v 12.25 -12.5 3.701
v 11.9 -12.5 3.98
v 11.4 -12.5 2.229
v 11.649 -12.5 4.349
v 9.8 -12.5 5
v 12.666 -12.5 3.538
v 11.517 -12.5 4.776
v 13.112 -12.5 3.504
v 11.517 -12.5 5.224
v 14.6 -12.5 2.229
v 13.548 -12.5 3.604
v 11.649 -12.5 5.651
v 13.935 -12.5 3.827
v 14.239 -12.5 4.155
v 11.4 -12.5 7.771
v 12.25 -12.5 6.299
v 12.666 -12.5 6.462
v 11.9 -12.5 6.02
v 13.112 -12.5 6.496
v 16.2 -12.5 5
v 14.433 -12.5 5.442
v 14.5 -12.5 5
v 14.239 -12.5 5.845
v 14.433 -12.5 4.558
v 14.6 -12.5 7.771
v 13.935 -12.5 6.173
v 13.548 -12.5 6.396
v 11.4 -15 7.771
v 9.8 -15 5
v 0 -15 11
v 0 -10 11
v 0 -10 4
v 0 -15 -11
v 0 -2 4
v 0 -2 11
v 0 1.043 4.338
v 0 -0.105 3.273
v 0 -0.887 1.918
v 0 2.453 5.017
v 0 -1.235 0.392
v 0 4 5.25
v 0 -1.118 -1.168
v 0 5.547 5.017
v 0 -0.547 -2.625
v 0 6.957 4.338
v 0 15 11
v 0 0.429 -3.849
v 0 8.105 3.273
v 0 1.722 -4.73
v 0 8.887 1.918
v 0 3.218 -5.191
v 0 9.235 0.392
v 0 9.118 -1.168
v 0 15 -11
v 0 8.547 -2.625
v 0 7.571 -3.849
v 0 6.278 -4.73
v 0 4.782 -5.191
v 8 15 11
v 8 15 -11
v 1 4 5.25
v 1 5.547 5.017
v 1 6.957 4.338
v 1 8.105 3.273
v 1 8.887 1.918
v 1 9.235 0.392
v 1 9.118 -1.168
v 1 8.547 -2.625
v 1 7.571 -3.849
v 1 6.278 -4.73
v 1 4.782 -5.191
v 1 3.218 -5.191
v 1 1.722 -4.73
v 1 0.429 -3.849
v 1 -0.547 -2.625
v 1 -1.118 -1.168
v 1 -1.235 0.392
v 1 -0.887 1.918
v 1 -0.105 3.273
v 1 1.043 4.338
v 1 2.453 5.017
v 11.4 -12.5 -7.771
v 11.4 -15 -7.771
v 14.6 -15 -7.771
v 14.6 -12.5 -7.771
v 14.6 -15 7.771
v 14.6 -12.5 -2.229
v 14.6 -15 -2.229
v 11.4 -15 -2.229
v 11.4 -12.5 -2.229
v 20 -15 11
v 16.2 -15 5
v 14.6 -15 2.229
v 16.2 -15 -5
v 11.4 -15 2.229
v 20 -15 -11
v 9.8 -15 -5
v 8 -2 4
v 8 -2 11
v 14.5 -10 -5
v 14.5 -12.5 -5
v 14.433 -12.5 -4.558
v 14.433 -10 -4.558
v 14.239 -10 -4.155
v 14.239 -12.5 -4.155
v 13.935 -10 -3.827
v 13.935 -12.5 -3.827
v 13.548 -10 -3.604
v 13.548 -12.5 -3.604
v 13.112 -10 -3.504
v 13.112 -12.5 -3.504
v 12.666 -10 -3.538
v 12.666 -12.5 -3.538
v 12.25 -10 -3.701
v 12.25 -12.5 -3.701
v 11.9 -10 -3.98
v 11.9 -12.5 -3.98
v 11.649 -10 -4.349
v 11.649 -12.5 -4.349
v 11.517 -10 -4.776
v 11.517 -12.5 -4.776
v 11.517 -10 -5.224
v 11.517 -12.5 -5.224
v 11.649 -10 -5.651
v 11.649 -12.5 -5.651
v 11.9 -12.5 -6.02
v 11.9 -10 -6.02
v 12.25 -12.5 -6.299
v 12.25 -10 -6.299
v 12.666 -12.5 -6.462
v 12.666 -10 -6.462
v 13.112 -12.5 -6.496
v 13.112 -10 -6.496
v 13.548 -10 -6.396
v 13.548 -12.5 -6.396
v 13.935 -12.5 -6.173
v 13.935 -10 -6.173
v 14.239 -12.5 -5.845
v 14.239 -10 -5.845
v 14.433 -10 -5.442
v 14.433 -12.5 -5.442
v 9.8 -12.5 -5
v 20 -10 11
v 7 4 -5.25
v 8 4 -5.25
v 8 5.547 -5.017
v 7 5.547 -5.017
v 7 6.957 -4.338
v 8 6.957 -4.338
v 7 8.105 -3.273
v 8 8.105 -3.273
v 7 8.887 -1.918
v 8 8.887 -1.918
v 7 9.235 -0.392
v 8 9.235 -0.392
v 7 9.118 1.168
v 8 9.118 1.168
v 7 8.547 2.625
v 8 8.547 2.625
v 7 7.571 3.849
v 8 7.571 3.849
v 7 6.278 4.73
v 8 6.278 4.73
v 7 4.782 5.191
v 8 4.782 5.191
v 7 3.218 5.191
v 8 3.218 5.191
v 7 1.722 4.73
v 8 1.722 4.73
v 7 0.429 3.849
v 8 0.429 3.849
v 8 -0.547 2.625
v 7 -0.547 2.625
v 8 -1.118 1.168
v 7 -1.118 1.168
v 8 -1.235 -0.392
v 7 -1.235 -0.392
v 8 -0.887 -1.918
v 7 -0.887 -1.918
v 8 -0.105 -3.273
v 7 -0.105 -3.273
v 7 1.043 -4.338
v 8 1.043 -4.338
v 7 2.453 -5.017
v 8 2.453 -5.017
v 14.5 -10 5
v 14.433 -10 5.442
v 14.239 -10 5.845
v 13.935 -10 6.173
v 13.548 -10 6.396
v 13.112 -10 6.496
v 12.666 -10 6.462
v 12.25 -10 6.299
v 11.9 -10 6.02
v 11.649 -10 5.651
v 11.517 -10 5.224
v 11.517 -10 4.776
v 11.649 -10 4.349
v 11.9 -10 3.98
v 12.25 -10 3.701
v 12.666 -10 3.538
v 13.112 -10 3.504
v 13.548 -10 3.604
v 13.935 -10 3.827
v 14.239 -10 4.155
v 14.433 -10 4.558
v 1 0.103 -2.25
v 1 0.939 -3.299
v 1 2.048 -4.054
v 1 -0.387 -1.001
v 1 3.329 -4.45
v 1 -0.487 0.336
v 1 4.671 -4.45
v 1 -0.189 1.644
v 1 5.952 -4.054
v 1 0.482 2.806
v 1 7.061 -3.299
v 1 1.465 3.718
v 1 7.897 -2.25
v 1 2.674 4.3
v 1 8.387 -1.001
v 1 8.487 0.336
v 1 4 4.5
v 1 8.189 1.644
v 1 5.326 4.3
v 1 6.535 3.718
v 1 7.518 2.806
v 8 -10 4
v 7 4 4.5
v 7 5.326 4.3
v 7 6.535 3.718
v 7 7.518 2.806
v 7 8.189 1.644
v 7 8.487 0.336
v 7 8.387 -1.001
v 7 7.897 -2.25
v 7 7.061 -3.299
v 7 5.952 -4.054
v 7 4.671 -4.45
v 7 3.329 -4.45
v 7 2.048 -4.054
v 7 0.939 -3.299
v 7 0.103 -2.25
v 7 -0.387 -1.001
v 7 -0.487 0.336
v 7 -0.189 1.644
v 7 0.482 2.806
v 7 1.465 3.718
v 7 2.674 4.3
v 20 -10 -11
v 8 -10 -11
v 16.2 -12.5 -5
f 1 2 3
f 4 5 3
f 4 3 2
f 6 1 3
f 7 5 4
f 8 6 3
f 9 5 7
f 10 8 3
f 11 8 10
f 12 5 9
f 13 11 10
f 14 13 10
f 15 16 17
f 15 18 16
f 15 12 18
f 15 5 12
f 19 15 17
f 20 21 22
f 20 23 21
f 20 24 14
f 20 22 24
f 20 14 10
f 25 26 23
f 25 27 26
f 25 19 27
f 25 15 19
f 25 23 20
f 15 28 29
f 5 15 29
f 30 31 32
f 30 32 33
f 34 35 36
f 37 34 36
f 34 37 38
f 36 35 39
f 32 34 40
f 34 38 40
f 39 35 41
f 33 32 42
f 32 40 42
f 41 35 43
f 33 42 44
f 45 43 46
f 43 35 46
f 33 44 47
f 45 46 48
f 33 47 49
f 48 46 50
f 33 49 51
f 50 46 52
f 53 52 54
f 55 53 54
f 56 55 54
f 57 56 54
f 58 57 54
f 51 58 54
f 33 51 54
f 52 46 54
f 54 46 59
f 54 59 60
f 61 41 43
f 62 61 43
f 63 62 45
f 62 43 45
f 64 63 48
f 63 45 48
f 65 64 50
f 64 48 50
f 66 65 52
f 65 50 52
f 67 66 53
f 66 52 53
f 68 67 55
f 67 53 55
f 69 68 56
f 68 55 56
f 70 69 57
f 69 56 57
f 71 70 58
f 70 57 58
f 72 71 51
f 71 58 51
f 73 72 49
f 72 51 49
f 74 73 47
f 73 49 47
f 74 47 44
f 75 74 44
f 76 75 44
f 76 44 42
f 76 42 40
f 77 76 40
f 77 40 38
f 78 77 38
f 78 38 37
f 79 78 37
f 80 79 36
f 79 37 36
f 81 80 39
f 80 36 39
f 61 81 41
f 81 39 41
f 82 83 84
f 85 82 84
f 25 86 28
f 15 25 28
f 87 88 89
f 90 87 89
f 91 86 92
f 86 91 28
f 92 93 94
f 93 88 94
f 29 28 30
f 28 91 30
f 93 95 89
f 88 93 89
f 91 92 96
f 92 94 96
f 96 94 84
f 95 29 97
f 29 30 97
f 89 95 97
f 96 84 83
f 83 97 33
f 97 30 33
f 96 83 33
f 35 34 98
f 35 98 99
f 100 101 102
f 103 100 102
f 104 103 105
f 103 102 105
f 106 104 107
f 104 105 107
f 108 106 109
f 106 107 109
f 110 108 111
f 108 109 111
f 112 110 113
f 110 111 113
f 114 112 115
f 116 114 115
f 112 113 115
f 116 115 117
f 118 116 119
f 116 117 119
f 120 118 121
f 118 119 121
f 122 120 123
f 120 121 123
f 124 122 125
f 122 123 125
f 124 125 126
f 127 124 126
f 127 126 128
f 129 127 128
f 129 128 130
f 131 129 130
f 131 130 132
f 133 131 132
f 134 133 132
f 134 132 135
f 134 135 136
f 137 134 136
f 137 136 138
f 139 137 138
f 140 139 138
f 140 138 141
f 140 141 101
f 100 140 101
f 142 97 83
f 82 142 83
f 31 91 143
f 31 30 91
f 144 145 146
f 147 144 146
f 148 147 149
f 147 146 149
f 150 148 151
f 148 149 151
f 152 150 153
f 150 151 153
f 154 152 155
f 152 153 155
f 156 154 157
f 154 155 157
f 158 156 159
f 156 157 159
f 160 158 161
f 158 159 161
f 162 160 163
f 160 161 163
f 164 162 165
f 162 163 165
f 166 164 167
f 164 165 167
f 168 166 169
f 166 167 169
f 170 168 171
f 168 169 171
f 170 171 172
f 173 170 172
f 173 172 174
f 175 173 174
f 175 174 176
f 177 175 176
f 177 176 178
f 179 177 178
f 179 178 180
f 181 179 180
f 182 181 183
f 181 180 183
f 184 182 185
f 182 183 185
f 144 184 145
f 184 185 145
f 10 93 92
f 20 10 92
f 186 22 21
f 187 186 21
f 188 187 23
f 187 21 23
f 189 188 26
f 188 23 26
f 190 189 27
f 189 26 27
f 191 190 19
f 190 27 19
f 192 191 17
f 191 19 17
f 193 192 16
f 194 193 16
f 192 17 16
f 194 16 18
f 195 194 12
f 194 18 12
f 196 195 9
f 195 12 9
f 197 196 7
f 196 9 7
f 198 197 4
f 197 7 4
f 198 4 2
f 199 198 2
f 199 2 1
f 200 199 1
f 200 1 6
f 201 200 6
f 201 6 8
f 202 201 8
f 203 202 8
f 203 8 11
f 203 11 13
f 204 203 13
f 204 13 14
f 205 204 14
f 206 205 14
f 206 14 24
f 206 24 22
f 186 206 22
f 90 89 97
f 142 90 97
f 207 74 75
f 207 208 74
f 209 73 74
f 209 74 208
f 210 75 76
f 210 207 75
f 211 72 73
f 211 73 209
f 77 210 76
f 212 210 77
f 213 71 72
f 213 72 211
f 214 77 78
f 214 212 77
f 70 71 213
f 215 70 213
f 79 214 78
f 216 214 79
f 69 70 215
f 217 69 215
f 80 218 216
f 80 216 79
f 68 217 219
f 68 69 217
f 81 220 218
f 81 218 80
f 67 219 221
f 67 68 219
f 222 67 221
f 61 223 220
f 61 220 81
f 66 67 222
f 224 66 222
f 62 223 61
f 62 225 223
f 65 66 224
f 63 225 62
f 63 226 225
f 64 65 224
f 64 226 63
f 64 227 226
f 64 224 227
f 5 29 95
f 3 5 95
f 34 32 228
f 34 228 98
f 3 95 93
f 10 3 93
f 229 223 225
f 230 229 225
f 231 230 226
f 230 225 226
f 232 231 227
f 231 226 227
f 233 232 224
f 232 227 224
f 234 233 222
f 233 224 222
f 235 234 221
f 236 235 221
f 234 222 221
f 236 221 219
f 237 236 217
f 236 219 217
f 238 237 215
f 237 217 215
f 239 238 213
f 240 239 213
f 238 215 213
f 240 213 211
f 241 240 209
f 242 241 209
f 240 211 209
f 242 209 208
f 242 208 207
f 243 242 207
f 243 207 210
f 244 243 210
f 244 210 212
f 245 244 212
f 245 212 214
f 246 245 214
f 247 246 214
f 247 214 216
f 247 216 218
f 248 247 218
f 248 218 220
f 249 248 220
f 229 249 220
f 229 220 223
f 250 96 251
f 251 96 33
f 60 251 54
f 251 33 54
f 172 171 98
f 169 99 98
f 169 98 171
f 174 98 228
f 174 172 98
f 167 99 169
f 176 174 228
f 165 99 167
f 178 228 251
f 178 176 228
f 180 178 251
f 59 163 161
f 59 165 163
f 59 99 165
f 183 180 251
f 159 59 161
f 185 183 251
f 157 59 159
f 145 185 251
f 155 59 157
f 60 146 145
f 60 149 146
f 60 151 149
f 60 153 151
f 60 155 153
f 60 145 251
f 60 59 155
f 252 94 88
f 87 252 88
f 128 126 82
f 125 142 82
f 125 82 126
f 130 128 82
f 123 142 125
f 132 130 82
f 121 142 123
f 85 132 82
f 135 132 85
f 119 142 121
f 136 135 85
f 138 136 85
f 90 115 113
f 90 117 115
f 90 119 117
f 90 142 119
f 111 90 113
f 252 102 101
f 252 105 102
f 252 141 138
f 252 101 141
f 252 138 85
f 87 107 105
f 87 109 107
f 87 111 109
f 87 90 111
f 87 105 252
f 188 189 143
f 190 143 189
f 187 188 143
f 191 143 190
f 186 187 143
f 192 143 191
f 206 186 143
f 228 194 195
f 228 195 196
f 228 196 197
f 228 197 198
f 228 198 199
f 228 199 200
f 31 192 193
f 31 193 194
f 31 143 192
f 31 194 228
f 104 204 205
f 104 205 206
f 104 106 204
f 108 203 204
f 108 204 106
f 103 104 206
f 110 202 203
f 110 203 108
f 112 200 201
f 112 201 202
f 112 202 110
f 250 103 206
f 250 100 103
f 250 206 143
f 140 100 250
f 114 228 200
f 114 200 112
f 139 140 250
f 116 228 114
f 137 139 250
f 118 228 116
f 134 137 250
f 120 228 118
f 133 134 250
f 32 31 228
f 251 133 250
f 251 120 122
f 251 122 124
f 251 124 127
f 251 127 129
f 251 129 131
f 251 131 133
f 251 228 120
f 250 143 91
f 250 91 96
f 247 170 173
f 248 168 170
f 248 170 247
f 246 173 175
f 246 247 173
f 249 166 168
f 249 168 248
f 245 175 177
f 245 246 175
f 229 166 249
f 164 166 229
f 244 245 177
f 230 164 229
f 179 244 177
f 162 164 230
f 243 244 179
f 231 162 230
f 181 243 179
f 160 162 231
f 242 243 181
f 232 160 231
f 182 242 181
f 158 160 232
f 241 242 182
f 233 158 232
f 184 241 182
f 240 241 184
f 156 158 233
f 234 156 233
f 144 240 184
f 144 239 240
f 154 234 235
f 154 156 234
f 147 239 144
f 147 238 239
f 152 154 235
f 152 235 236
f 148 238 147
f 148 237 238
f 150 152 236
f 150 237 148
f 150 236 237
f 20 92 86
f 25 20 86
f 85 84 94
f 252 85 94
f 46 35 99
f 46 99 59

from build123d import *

# Parameters (mm, degrees)
SKETCH_1_W             = 22
SKETCH_1_H             = 30
EXTRUDE_1_DEPTH        = 8
SKETCH_2_R             = 4.5
CUT_EXTRUDE_1_DEPTH    = 9
SKETCH_3_W             = 7
SKETCH_3_H             = 8
CUT_EXTRUDE_2_DEPTH    = 9
SKETCH_4_R             = 5.25
CUT_EXTRUDE_3_DEPTH    = 1
SKETCH_5_R             = 5.25
CUT_EXTRUDE_4_DEPTH    = 1
SKETCH_6_W             = 22
SKETCH_6_H             = 5
EXTRUDE_2_DEPTH        = 12
CUT_EXTRUDE_5_DEPTH    = 2.5
PATTERN_LINEAR_1_COUNT = 2
PATTERN_LINEAR_1_PITCH = 10
SKETCH_8_R             = 1.5
CUT_EXTRUDE_6_DEPTH    = 28.5
PATTERN_LINEAR_2_COUNT = 2
PATTERN_LINEAR_2_PITCH = 10


with BuildPart() as part:
    # 草图1 → 凸台-拉伸1 (new body)
    with BuildSketch(Plane(origin=(0, 0, 0), x_dir=(0, 0, -1), z_dir=(1, 0, 0))):
        Rectangle(SKETCH_1_W, SKETCH_1_H)
    extrude(amount=EXTRUDE_1_DEPTH)

    # 草图2 → 切除-拉伸1 (cut, through all)
    with BuildSketch(Plane.ZY):
        with Locations((0, 4)):
            Circle(SKETCH_2_R)
    extrude(amount=-CUT_EXTRUDE_1_DEPTH, mode=Mode.SUBTRACT)

    # 草图3 → 切除-拉伸2 (cut, through all)
    with BuildSketch(Plane.ZY):
        with Locations((7.5, -6)):
            Rectangle(SKETCH_3_W, SKETCH_3_H)
    extrude(amount=-CUT_EXTRUDE_2_DEPTH, mode=Mode.SUBTRACT)

    # 草图4 → 切除-拉伸3 (cut)
    with BuildSketch(Plane.ZY):
        with Locations((0, 4)):
            Circle(SKETCH_4_R)
    extrude(amount=-CUT_EXTRUDE_3_DEPTH, mode=Mode.SUBTRACT)

    # 草图5 → 切除-拉伸4 (cut)
    with BuildSketch(Plane(origin=(8, 0, 0), x_dir=(0, 0, -1), z_dir=(1, 0, 0))):
        with Locations((0, 4)):
            Circle(SKETCH_5_R)
    extrude(amount=-CUT_EXTRUDE_4_DEPTH, mode=Mode.SUBTRACT)

    # 草图6 → 凸台-拉伸2 (add)
    with BuildSketch(Plane(origin=(8, 0, 0), x_dir=(0, 0, -1), z_dir=(1, 0, 0))):
        with Locations((0, -12.5)):
            Rectangle(SKETCH_6_W, SKETCH_6_H)
    extrude(amount=EXTRUDE_2_DEPTH)

    # 草图7 → 切除-拉伸5 (cut)
    with BuildSketch(Plane.XZ.offset(15)):
        Polygon((9.8, -5), (11.4, -7.771281292), (14.6, -7.771281292), (16.2, -5), (14.6, -2.228718708), (11.4, -2.228718708), align=None)
    cut_extrude_5 = extrude(amount=-CUT_EXTRUDE_5_DEPTH, mode=Mode.SUBTRACT)

    # 阵列(线性)1: 切除-拉伸5 ×2
    with Locations(*[(0, 0, i * PATTERN_LINEAR_1_PITCH) for i in range(1, PATTERN_LINEAR_1_COUNT)]):
        add(cut_extrude_5, mode=Mode.SUBTRACT)

    # 草图8 → 切除-拉伸6 (cut, through all)
    with BuildSketch(Plane.XZ.offset(12.5)):
        with Locations((13, 5)):
            Circle(SKETCH_8_R)
    cut_extrude_6 = extrude(amount=-CUT_EXTRUDE_6_DEPTH, mode=Mode.SUBTRACT)

    # 阵列(线性)2: 切除-拉伸6 ×2
    with Locations(*[(0, 0, -i * PATTERN_LINEAR_2_PITCH) for i in range(1, PATTERN_LINEAR_2_COUNT)]):
        add(cut_extrude_6, mode=Mode.SUBTRACT)


solid = part.part
